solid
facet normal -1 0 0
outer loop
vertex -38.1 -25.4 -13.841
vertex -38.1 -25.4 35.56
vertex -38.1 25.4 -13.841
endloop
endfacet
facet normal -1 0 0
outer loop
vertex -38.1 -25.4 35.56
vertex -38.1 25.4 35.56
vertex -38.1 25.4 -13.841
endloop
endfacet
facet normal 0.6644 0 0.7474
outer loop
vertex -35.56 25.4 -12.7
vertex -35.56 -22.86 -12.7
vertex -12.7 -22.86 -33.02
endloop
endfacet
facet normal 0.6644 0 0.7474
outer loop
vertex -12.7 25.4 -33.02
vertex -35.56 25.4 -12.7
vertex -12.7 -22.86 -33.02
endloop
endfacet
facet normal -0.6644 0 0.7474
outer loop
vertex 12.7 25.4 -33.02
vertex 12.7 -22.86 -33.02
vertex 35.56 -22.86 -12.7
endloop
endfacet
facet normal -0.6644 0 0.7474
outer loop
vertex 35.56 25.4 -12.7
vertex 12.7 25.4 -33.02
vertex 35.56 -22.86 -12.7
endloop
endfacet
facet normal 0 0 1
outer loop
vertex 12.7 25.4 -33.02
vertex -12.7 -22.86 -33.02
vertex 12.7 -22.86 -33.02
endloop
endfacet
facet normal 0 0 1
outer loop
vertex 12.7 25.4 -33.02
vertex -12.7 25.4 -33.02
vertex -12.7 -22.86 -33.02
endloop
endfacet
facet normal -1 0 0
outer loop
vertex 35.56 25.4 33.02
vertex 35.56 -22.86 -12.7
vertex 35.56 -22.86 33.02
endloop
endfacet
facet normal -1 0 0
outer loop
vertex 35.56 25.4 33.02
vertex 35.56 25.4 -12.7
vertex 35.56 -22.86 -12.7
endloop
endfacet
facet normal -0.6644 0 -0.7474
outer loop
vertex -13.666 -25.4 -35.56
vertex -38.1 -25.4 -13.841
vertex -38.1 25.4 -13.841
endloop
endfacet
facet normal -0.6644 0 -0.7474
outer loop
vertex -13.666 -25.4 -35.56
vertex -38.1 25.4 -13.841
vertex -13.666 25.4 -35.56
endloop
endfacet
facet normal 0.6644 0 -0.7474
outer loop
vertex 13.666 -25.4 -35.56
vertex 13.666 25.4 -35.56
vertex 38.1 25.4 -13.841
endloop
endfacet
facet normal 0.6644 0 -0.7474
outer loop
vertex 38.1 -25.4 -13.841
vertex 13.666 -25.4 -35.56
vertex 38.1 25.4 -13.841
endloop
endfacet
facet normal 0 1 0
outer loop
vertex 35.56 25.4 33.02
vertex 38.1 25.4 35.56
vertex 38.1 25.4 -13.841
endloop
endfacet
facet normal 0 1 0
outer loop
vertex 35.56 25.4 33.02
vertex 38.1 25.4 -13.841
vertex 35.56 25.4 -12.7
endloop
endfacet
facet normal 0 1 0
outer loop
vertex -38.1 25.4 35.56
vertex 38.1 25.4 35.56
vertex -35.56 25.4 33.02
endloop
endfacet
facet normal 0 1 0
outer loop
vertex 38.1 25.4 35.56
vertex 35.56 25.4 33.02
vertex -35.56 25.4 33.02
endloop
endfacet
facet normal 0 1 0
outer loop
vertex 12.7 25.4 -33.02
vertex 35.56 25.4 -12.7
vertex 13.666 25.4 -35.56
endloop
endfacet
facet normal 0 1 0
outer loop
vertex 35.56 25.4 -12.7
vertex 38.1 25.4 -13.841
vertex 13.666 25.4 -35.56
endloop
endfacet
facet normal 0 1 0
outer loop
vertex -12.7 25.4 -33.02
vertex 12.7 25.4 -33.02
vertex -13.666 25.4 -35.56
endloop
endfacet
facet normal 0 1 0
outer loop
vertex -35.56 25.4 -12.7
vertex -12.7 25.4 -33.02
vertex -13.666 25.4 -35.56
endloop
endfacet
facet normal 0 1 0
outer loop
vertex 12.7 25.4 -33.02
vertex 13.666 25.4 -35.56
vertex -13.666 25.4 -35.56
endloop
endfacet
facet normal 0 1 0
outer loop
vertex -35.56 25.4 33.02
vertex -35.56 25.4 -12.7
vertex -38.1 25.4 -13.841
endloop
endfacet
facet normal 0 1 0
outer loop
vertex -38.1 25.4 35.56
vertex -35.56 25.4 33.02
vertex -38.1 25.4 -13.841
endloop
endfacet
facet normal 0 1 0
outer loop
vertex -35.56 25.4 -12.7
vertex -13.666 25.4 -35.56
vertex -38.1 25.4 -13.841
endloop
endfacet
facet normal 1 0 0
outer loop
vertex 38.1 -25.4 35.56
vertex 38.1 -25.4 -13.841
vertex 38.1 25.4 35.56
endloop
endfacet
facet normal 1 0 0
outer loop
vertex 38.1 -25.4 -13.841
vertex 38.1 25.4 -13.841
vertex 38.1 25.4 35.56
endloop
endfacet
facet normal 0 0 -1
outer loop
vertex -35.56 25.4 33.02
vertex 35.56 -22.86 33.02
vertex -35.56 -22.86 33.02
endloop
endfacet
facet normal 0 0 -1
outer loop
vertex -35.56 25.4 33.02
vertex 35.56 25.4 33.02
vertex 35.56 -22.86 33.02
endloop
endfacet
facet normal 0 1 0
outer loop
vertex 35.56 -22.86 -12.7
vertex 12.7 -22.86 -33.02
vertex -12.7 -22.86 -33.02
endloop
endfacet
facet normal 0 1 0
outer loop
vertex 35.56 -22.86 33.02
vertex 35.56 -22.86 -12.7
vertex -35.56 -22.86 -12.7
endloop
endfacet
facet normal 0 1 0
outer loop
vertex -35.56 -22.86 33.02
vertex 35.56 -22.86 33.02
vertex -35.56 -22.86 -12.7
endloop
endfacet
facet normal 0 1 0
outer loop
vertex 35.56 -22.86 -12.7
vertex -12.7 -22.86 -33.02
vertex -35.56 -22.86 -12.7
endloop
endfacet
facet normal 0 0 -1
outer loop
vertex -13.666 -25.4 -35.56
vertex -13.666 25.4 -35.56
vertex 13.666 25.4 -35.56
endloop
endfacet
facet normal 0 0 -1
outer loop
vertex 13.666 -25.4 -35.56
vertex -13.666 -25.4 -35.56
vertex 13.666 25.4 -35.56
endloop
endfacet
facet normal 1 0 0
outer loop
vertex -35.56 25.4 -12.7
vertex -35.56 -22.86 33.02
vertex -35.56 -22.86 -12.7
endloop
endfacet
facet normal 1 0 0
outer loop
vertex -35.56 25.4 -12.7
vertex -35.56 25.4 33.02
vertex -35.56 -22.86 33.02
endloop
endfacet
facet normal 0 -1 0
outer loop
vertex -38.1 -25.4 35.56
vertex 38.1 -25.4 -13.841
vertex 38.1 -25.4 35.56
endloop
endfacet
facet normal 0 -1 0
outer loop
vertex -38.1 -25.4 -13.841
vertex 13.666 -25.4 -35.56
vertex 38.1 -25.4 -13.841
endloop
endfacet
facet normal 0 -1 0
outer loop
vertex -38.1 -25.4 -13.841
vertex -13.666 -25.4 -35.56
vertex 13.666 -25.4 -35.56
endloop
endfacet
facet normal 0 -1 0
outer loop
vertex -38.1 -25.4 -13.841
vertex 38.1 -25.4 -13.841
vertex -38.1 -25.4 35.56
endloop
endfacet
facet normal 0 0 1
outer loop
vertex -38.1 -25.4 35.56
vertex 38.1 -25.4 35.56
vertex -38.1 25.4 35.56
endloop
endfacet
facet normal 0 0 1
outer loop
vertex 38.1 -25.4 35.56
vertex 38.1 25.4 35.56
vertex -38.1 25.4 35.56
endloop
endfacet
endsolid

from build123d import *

# Parameters (mm, degrees)
BOSS_EXTRUDE1_DEPTH = 25.4
SHELL1_T            = -2.54


with BuildPart() as part:
    # Sketch2 → Boss-Extrude1 (new, symmetric)
    # profile 1 of 2: a face of its own
    with BuildSketch(Plane(origin=(0, 0, 0), x_dir=(1, 0, 0), z_dir=(0, 1, 0))):
        Polygon((13.665706279, 35.56), (38.1, 13.840627803), (38.1, -35.56), (-38.1, -35.56), (-38.1, 13.840627803), (-13.665706279, 35.56), align=None)
        Polygon((12.7, 33.02), (35.56, 12.7), (35.56, -33.02), (-35.56, -33.02), (-35.56, 12.7), (-12.7, 33.02), align=None, mode=Mode.SUBTRACT)
    # profile 2 of 2: a face of its own
    with BuildSketch(Plane(origin=(0, 0, 0), x_dir=(1, 0, 0), z_dir=(0, 1, 0))):
        Polygon((35.56, 12.7), (35.56, -33.02), (-35.56, -33.02), (-35.56, 12.7), (-12.7, 33.02), (12.7, 33.02), align=None)
    extrude(amount=BOSS_EXTRUDE1_DEPTH, both=True)

    # Shell1
    shell1_openings = [part.faces().sort_by_distance(p)[0] for p in [
        (0, 25.4, 3.07436115),
    ]]
    offset(amount=SHELL1_T, openings=shell1_openings, kind=Kind.INTERSECTION)


solid = part.part
